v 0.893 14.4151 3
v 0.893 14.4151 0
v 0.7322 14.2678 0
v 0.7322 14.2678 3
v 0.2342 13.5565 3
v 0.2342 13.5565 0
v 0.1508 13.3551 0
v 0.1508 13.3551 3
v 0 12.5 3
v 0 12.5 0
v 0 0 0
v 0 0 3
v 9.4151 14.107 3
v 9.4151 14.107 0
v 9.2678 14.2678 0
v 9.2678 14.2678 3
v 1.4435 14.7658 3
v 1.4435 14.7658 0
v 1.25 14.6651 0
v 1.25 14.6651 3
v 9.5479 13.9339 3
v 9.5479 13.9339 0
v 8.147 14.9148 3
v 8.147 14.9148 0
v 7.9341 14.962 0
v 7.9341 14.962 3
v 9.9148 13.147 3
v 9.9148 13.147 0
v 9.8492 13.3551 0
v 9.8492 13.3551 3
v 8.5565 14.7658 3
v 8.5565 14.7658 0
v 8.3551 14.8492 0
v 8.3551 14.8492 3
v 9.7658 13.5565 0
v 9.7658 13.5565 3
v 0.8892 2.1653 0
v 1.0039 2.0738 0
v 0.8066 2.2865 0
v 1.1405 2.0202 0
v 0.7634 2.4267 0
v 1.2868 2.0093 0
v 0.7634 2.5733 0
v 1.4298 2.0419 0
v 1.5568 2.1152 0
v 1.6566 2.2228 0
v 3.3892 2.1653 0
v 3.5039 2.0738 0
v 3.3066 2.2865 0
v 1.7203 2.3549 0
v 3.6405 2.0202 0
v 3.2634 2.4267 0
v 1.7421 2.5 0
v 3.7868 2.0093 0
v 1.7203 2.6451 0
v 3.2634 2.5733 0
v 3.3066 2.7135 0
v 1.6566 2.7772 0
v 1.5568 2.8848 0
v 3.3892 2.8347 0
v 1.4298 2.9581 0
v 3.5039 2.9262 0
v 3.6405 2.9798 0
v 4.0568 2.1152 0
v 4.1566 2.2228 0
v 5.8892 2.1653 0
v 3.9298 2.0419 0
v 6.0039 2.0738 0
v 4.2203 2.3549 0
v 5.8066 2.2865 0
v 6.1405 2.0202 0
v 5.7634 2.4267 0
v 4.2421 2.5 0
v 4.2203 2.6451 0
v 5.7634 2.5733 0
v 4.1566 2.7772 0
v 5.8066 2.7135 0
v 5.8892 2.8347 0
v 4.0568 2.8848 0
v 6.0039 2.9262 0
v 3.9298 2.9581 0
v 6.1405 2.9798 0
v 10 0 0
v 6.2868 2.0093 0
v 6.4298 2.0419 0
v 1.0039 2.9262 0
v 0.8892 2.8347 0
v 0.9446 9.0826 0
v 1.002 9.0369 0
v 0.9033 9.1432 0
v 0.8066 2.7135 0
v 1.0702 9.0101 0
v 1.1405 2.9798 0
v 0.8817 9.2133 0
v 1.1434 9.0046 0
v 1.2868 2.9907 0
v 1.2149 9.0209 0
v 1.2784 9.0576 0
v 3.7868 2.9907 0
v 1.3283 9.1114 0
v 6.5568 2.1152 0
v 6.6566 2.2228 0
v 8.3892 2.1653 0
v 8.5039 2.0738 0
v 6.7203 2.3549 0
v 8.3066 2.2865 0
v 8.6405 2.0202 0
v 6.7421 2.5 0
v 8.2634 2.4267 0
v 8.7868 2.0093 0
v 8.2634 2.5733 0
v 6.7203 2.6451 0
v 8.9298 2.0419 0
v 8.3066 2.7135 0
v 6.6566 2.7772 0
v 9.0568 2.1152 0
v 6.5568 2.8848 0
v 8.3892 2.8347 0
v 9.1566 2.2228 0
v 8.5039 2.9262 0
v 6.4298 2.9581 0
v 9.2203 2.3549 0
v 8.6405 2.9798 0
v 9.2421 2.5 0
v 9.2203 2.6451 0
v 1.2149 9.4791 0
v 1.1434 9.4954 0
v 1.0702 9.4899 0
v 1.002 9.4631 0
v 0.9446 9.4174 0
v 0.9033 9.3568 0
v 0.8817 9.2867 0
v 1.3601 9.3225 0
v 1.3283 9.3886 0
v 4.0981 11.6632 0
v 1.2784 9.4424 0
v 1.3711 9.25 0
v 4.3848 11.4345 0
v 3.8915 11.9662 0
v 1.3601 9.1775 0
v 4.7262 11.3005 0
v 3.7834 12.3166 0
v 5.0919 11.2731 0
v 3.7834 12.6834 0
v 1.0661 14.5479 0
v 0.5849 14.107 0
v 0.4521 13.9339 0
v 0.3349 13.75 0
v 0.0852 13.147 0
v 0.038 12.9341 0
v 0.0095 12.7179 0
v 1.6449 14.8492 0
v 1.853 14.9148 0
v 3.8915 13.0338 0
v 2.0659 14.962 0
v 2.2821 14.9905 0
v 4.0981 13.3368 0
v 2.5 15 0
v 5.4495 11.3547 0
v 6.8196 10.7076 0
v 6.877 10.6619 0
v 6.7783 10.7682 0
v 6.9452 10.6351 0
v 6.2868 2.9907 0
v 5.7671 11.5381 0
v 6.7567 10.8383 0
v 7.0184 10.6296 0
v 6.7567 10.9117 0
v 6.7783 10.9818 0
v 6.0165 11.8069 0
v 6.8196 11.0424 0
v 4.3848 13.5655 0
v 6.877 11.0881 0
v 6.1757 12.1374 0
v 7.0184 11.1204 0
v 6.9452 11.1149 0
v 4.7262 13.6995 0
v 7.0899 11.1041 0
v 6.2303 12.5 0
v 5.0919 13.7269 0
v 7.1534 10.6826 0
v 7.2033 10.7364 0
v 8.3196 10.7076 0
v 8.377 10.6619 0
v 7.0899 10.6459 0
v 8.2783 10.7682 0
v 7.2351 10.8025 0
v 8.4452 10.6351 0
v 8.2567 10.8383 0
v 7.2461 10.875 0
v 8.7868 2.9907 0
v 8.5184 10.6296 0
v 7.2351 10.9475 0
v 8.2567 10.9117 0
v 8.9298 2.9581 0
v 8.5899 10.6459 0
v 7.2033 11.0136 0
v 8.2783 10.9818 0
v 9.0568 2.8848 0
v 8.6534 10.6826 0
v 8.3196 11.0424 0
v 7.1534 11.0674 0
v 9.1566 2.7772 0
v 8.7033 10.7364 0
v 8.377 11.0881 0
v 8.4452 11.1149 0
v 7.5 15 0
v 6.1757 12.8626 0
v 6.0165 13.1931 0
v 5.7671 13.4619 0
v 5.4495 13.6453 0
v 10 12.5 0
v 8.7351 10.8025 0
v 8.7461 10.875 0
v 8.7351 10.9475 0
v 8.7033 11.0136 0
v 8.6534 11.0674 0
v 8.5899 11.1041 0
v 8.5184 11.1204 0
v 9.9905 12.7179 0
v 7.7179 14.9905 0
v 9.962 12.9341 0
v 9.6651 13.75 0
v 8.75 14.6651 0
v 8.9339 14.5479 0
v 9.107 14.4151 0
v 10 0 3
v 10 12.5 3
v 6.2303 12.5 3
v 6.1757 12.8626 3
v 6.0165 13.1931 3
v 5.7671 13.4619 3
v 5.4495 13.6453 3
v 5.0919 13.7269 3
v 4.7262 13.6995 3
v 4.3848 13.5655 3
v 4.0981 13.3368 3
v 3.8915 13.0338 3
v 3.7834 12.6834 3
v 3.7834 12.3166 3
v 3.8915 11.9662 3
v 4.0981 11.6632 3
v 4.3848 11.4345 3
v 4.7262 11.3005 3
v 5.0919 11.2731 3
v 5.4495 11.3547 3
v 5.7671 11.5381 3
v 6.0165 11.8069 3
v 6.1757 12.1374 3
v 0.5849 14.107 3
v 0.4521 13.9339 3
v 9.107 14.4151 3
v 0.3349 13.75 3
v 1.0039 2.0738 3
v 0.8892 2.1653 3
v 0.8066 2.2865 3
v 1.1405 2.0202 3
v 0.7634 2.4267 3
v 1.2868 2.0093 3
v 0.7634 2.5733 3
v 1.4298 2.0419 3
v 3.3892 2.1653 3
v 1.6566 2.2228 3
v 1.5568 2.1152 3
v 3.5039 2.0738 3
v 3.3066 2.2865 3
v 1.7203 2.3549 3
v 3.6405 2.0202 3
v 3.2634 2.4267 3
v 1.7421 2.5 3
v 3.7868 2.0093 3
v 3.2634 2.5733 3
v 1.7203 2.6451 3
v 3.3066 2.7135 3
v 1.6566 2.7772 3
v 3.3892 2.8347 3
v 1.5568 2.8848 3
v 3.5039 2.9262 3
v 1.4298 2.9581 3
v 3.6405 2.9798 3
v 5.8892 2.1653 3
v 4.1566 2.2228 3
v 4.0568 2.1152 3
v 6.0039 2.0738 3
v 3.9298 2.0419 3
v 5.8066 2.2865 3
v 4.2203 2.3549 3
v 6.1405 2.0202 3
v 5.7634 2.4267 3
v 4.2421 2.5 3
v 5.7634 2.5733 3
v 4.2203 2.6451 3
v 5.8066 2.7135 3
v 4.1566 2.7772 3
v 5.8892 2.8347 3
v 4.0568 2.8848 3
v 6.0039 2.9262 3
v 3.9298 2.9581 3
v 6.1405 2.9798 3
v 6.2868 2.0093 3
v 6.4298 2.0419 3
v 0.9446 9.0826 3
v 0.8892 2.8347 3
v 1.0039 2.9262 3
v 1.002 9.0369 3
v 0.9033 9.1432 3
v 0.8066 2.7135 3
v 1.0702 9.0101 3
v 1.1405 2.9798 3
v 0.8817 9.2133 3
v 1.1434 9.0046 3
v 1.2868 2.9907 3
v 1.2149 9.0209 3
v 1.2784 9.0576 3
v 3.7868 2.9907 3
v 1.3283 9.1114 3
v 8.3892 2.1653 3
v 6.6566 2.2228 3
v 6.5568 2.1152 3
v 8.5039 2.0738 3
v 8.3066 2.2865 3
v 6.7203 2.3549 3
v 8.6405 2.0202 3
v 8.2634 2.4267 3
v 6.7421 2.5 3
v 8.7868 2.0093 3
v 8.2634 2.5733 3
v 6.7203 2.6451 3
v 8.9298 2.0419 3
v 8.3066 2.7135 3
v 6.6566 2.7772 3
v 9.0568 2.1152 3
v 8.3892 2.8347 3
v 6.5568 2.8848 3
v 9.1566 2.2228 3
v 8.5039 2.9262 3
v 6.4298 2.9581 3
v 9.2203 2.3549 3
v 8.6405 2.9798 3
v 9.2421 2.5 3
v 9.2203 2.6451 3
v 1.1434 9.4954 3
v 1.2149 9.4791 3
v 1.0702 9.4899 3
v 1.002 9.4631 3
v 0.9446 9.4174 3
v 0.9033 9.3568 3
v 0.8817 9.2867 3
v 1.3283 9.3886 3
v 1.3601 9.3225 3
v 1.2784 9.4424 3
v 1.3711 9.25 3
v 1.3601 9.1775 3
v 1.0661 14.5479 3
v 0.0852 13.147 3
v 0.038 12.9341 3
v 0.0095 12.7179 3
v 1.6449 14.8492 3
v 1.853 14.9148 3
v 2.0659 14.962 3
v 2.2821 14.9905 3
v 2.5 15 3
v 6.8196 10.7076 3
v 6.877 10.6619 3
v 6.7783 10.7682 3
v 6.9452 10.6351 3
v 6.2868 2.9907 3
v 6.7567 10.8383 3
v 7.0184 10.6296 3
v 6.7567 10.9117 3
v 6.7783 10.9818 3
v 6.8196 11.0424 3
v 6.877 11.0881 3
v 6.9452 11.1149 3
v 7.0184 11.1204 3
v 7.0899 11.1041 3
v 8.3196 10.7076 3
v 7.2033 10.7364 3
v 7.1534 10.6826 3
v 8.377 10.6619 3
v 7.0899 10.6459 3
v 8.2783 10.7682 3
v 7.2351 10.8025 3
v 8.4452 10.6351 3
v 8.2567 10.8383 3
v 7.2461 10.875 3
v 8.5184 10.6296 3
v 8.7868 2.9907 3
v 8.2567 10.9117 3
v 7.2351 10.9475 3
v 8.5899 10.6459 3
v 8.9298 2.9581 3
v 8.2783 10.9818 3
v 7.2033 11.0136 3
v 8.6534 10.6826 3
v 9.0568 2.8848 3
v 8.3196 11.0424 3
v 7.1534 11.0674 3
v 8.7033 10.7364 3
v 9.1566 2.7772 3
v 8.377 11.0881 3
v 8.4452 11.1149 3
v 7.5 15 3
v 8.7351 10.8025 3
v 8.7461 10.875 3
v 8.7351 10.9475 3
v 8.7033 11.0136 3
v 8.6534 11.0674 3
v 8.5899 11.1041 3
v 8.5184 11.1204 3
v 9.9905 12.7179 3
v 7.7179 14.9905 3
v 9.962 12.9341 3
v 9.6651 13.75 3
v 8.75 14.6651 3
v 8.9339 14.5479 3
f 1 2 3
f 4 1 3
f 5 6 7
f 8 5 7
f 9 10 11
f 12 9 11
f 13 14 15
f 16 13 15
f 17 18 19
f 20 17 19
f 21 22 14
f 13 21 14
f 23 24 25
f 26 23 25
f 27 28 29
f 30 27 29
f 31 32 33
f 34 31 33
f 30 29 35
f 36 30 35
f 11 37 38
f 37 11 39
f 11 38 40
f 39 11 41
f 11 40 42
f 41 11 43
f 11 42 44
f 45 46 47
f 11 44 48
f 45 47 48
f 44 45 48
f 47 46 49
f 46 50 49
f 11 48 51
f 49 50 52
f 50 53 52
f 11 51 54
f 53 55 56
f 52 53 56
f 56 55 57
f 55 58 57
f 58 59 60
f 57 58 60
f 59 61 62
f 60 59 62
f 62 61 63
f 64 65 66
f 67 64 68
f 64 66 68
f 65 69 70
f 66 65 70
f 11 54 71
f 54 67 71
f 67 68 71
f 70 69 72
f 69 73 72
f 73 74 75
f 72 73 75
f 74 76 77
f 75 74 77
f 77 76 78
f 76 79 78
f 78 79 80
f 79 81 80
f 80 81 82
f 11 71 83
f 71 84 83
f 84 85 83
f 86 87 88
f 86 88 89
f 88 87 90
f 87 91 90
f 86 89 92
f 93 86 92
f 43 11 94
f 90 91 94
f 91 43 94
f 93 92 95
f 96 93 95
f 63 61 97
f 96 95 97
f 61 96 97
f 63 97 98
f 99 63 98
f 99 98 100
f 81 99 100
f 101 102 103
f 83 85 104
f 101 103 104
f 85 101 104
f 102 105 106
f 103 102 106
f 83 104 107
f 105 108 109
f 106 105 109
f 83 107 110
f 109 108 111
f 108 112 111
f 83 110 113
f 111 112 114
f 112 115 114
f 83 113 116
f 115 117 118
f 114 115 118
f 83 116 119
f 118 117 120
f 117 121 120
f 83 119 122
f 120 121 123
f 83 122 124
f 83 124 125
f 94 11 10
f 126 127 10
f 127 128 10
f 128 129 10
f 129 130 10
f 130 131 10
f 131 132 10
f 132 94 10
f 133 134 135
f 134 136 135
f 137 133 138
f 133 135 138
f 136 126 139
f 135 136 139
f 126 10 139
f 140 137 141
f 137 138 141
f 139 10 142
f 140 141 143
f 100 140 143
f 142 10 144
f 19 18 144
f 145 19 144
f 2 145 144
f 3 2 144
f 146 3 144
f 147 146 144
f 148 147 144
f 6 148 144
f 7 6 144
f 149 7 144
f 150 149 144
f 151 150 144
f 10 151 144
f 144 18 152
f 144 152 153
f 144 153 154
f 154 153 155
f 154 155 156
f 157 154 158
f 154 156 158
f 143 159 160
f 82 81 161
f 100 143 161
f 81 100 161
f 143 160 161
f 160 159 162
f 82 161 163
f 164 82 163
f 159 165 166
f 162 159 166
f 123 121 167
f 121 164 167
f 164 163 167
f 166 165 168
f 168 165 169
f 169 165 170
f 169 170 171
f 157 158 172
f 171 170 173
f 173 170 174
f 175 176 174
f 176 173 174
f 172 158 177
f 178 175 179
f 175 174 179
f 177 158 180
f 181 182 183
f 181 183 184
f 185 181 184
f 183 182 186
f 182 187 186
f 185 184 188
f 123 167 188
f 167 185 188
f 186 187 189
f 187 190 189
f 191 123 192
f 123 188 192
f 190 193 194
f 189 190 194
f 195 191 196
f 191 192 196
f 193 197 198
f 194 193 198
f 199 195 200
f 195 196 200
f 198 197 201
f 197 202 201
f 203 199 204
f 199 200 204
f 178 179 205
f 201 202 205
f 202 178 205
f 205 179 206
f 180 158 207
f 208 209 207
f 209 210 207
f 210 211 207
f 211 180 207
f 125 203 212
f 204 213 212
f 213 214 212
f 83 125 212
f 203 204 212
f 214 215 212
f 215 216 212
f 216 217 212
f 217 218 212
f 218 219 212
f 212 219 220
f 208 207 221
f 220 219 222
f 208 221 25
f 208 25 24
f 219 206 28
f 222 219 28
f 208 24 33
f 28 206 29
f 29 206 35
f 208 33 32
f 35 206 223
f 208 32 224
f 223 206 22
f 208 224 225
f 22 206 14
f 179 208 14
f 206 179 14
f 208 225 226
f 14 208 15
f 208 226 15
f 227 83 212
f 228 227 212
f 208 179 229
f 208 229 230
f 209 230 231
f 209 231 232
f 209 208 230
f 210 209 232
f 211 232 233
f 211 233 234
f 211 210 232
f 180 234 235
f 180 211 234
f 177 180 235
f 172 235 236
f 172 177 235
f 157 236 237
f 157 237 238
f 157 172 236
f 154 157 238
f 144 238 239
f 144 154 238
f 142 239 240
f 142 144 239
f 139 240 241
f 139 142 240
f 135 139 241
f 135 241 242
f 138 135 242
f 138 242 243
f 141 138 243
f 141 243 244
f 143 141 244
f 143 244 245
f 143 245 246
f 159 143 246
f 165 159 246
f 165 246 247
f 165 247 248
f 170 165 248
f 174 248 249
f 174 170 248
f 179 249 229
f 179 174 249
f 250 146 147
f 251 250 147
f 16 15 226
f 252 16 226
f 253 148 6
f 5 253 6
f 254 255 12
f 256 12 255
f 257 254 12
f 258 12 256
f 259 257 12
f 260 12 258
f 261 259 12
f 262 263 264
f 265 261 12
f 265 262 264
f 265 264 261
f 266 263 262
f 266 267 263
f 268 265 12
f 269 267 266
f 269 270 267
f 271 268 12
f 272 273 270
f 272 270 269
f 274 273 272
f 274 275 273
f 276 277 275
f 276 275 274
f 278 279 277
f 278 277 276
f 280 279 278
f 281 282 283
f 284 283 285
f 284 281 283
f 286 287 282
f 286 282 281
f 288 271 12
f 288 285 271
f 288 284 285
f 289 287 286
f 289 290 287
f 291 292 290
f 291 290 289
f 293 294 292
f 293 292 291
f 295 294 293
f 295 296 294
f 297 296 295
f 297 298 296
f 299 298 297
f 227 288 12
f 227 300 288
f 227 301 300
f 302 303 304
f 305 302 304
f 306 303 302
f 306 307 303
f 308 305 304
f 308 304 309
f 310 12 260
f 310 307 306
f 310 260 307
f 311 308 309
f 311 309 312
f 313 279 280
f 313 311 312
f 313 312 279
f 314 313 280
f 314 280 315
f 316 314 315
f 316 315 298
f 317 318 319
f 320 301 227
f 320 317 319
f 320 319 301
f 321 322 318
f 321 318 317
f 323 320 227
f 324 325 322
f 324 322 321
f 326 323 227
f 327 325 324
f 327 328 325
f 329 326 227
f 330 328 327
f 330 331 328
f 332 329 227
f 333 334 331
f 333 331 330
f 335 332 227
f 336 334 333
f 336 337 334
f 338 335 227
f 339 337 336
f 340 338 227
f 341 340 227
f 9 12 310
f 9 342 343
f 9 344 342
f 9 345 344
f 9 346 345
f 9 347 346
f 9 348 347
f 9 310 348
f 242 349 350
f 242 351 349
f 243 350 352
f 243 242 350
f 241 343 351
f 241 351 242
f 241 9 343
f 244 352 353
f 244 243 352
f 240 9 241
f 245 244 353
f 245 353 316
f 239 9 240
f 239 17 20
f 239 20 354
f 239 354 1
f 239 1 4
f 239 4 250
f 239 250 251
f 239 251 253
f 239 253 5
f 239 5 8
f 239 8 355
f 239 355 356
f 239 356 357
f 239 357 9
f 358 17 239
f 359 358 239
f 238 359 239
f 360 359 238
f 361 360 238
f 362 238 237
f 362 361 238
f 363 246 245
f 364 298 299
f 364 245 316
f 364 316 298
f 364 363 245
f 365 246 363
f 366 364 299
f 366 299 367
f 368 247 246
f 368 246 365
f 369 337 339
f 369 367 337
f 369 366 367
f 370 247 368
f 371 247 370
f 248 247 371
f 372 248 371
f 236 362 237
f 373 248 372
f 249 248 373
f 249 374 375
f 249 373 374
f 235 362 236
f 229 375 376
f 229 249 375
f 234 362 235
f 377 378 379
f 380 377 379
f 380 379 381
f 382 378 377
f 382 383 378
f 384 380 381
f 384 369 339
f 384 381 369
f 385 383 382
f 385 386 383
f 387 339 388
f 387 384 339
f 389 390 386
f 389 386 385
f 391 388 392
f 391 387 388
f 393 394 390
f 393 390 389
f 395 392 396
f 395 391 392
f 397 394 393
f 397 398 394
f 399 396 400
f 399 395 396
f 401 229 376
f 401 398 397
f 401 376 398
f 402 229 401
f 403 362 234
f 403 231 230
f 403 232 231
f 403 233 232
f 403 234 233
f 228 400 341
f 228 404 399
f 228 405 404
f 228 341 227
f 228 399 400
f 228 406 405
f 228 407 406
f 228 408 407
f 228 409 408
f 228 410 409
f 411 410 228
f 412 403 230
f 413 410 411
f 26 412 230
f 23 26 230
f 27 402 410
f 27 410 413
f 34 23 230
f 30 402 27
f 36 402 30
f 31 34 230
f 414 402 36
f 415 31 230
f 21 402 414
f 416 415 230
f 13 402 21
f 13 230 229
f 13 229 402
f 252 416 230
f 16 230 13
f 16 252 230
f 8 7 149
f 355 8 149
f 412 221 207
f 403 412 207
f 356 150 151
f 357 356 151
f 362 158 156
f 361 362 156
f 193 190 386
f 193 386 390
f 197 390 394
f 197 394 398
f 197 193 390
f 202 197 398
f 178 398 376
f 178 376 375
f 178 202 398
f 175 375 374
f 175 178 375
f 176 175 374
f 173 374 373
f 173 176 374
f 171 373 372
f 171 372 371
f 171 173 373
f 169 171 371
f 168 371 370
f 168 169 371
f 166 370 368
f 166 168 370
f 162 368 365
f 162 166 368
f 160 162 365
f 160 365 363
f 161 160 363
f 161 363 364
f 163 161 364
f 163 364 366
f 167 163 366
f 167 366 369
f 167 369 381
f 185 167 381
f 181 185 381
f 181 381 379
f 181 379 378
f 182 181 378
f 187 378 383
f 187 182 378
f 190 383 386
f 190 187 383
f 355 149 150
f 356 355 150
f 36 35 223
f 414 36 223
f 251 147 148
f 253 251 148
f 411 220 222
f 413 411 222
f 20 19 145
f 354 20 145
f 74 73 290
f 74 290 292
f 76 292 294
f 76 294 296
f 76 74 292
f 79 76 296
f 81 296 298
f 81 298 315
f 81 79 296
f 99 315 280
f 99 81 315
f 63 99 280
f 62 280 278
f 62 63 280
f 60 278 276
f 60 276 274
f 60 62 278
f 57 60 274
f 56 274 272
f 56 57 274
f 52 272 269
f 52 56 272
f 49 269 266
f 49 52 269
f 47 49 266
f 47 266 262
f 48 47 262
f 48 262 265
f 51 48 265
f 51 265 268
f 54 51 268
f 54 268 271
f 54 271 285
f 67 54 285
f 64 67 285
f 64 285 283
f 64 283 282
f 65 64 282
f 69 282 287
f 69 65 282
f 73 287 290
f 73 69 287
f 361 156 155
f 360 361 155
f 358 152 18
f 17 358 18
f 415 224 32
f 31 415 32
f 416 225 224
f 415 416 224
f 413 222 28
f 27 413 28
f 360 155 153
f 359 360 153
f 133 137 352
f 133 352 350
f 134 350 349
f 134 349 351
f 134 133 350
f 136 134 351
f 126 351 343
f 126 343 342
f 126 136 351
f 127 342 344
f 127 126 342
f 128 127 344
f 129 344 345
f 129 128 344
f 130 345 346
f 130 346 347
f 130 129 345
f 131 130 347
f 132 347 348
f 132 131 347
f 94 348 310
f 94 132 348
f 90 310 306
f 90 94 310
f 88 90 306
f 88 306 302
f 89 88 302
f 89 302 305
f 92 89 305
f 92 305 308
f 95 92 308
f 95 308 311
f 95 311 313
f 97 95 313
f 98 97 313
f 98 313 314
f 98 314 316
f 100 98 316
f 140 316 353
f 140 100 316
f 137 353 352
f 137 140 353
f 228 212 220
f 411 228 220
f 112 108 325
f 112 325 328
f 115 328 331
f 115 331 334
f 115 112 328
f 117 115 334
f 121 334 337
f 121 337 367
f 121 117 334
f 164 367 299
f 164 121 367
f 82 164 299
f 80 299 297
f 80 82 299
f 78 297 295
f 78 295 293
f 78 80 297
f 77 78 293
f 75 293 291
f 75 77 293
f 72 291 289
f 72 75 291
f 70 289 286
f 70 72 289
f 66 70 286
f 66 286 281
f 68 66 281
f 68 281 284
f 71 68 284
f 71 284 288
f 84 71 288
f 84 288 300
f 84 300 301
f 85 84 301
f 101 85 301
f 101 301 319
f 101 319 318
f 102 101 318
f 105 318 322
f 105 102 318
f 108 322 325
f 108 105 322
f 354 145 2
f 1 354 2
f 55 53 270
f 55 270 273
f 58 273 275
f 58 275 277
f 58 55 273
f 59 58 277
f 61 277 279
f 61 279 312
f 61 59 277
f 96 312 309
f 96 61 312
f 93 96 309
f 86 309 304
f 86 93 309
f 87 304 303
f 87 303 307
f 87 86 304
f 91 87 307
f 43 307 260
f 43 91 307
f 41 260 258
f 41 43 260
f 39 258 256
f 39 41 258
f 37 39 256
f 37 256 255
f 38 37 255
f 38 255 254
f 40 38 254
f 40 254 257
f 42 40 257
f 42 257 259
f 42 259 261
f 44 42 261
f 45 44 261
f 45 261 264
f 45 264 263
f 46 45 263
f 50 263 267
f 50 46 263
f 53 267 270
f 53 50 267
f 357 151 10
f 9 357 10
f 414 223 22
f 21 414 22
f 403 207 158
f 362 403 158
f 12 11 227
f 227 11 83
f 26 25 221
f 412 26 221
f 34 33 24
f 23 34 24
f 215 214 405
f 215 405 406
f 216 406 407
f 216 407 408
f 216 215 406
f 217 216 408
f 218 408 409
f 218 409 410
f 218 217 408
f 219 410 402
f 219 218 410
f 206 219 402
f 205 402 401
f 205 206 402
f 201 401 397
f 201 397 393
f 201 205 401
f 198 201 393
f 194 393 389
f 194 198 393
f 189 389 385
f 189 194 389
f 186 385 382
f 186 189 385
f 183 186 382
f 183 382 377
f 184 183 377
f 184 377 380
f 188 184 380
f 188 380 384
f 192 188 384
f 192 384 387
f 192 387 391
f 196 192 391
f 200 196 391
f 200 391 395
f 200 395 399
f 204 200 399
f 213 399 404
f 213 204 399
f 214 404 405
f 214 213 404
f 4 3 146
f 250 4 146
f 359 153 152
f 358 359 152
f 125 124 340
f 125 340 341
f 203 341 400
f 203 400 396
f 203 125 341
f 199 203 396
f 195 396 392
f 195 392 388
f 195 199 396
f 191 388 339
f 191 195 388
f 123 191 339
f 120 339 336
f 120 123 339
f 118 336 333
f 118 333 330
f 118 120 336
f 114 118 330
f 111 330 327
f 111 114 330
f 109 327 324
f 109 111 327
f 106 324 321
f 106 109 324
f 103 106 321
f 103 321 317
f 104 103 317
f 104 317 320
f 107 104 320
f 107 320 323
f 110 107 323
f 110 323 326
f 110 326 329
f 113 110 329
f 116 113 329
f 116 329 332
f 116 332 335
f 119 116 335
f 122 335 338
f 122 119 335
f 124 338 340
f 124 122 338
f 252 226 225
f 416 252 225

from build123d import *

# Parameters (mm, degrees)
MODEL_R             = 1.230314961
MODEL_R_2           = 0.492125984
MODEL_R_3           = 0.246062992
BOSS_EXTRUDE1_DEPTH = 3


with BuildPart() as part:
    # Model → Boss-Extrude1 (new body)
    with BuildSketch(Plane.XY):
        Polygon((0, 0), (10, 0), (10, 12.5), (9.99048659, 12.71788878), (9.962020177, 12.93411971), (9.914816068, 13.147047244), (9.849231053, 13.355050443), (9.765769562, 13.556545276), (9.665062131, 13.75), (9.547880782, 13.933941314), (9.415111344, 14.106969734), (9.267765748, 14.267765748), (9.106969734, 14.415111344), (8.933941314, 14.547880782), (8.75, 14.665062131), (8.556545276, 14.765769562), (8.355050443, 14.849231053), (8.147047244, 14.914816068), (7.93411971, 14.962020177), (7.71788878, 14.99048659), (7.5, 15), (2.5, 15), (2.28211122, 14.99048659), (2.06588029, 14.962020177), (1.852952756, 14.914816068), (1.644949557, 14.849231053), (1.443454724, 14.765769562), (1.25, 14.665062131), (1.066058686, 14.547880782), (0.893030266, 14.415111344), (0.732234252, 14.267765748), (0.584888656, 14.106969734), (0.452119218, 13.933941314), (0.334937869, 13.75), (0.234230438, 13.556545276), (0.150768947, 13.355050443), (0.085183932, 13.147047244), (0.037979823, 12.93411971), (0.00951341, 12.71788878), (0, 12.5), align=None)
        with Locations((5, 12.5)):
            Circle(MODEL_R, mode=Mode.SUBTRACT)
        with Locations((8.75, 2.5)):
            Circle(MODEL_R_2, mode=Mode.SUBTRACT)
        with Locations((6.25, 2.5)):
            Circle(MODEL_R_2, mode=Mode.SUBTRACT)
        with Locations((3.75, 2.5)):
            Circle(MODEL_R_2, mode=Mode.SUBTRACT)
        with Locations((1.25, 2.5)):
            Circle(MODEL_R_2, mode=Mode.SUBTRACT)
        with Locations((1.125, 9.25)):
            Circle(MODEL_R_3, mode=Mode.SUBTRACT)
        with Locations((8.5, 10.875)):
            Circle(MODEL_R_3, mode=Mode.SUBTRACT)
        with Locations((7, 10.875)):
            Circle(MODEL_R_3, mode=Mode.SUBTRACT)
    extrude(amount=BOSS_EXTRUDE1_DEPTH)


solid = part.part
